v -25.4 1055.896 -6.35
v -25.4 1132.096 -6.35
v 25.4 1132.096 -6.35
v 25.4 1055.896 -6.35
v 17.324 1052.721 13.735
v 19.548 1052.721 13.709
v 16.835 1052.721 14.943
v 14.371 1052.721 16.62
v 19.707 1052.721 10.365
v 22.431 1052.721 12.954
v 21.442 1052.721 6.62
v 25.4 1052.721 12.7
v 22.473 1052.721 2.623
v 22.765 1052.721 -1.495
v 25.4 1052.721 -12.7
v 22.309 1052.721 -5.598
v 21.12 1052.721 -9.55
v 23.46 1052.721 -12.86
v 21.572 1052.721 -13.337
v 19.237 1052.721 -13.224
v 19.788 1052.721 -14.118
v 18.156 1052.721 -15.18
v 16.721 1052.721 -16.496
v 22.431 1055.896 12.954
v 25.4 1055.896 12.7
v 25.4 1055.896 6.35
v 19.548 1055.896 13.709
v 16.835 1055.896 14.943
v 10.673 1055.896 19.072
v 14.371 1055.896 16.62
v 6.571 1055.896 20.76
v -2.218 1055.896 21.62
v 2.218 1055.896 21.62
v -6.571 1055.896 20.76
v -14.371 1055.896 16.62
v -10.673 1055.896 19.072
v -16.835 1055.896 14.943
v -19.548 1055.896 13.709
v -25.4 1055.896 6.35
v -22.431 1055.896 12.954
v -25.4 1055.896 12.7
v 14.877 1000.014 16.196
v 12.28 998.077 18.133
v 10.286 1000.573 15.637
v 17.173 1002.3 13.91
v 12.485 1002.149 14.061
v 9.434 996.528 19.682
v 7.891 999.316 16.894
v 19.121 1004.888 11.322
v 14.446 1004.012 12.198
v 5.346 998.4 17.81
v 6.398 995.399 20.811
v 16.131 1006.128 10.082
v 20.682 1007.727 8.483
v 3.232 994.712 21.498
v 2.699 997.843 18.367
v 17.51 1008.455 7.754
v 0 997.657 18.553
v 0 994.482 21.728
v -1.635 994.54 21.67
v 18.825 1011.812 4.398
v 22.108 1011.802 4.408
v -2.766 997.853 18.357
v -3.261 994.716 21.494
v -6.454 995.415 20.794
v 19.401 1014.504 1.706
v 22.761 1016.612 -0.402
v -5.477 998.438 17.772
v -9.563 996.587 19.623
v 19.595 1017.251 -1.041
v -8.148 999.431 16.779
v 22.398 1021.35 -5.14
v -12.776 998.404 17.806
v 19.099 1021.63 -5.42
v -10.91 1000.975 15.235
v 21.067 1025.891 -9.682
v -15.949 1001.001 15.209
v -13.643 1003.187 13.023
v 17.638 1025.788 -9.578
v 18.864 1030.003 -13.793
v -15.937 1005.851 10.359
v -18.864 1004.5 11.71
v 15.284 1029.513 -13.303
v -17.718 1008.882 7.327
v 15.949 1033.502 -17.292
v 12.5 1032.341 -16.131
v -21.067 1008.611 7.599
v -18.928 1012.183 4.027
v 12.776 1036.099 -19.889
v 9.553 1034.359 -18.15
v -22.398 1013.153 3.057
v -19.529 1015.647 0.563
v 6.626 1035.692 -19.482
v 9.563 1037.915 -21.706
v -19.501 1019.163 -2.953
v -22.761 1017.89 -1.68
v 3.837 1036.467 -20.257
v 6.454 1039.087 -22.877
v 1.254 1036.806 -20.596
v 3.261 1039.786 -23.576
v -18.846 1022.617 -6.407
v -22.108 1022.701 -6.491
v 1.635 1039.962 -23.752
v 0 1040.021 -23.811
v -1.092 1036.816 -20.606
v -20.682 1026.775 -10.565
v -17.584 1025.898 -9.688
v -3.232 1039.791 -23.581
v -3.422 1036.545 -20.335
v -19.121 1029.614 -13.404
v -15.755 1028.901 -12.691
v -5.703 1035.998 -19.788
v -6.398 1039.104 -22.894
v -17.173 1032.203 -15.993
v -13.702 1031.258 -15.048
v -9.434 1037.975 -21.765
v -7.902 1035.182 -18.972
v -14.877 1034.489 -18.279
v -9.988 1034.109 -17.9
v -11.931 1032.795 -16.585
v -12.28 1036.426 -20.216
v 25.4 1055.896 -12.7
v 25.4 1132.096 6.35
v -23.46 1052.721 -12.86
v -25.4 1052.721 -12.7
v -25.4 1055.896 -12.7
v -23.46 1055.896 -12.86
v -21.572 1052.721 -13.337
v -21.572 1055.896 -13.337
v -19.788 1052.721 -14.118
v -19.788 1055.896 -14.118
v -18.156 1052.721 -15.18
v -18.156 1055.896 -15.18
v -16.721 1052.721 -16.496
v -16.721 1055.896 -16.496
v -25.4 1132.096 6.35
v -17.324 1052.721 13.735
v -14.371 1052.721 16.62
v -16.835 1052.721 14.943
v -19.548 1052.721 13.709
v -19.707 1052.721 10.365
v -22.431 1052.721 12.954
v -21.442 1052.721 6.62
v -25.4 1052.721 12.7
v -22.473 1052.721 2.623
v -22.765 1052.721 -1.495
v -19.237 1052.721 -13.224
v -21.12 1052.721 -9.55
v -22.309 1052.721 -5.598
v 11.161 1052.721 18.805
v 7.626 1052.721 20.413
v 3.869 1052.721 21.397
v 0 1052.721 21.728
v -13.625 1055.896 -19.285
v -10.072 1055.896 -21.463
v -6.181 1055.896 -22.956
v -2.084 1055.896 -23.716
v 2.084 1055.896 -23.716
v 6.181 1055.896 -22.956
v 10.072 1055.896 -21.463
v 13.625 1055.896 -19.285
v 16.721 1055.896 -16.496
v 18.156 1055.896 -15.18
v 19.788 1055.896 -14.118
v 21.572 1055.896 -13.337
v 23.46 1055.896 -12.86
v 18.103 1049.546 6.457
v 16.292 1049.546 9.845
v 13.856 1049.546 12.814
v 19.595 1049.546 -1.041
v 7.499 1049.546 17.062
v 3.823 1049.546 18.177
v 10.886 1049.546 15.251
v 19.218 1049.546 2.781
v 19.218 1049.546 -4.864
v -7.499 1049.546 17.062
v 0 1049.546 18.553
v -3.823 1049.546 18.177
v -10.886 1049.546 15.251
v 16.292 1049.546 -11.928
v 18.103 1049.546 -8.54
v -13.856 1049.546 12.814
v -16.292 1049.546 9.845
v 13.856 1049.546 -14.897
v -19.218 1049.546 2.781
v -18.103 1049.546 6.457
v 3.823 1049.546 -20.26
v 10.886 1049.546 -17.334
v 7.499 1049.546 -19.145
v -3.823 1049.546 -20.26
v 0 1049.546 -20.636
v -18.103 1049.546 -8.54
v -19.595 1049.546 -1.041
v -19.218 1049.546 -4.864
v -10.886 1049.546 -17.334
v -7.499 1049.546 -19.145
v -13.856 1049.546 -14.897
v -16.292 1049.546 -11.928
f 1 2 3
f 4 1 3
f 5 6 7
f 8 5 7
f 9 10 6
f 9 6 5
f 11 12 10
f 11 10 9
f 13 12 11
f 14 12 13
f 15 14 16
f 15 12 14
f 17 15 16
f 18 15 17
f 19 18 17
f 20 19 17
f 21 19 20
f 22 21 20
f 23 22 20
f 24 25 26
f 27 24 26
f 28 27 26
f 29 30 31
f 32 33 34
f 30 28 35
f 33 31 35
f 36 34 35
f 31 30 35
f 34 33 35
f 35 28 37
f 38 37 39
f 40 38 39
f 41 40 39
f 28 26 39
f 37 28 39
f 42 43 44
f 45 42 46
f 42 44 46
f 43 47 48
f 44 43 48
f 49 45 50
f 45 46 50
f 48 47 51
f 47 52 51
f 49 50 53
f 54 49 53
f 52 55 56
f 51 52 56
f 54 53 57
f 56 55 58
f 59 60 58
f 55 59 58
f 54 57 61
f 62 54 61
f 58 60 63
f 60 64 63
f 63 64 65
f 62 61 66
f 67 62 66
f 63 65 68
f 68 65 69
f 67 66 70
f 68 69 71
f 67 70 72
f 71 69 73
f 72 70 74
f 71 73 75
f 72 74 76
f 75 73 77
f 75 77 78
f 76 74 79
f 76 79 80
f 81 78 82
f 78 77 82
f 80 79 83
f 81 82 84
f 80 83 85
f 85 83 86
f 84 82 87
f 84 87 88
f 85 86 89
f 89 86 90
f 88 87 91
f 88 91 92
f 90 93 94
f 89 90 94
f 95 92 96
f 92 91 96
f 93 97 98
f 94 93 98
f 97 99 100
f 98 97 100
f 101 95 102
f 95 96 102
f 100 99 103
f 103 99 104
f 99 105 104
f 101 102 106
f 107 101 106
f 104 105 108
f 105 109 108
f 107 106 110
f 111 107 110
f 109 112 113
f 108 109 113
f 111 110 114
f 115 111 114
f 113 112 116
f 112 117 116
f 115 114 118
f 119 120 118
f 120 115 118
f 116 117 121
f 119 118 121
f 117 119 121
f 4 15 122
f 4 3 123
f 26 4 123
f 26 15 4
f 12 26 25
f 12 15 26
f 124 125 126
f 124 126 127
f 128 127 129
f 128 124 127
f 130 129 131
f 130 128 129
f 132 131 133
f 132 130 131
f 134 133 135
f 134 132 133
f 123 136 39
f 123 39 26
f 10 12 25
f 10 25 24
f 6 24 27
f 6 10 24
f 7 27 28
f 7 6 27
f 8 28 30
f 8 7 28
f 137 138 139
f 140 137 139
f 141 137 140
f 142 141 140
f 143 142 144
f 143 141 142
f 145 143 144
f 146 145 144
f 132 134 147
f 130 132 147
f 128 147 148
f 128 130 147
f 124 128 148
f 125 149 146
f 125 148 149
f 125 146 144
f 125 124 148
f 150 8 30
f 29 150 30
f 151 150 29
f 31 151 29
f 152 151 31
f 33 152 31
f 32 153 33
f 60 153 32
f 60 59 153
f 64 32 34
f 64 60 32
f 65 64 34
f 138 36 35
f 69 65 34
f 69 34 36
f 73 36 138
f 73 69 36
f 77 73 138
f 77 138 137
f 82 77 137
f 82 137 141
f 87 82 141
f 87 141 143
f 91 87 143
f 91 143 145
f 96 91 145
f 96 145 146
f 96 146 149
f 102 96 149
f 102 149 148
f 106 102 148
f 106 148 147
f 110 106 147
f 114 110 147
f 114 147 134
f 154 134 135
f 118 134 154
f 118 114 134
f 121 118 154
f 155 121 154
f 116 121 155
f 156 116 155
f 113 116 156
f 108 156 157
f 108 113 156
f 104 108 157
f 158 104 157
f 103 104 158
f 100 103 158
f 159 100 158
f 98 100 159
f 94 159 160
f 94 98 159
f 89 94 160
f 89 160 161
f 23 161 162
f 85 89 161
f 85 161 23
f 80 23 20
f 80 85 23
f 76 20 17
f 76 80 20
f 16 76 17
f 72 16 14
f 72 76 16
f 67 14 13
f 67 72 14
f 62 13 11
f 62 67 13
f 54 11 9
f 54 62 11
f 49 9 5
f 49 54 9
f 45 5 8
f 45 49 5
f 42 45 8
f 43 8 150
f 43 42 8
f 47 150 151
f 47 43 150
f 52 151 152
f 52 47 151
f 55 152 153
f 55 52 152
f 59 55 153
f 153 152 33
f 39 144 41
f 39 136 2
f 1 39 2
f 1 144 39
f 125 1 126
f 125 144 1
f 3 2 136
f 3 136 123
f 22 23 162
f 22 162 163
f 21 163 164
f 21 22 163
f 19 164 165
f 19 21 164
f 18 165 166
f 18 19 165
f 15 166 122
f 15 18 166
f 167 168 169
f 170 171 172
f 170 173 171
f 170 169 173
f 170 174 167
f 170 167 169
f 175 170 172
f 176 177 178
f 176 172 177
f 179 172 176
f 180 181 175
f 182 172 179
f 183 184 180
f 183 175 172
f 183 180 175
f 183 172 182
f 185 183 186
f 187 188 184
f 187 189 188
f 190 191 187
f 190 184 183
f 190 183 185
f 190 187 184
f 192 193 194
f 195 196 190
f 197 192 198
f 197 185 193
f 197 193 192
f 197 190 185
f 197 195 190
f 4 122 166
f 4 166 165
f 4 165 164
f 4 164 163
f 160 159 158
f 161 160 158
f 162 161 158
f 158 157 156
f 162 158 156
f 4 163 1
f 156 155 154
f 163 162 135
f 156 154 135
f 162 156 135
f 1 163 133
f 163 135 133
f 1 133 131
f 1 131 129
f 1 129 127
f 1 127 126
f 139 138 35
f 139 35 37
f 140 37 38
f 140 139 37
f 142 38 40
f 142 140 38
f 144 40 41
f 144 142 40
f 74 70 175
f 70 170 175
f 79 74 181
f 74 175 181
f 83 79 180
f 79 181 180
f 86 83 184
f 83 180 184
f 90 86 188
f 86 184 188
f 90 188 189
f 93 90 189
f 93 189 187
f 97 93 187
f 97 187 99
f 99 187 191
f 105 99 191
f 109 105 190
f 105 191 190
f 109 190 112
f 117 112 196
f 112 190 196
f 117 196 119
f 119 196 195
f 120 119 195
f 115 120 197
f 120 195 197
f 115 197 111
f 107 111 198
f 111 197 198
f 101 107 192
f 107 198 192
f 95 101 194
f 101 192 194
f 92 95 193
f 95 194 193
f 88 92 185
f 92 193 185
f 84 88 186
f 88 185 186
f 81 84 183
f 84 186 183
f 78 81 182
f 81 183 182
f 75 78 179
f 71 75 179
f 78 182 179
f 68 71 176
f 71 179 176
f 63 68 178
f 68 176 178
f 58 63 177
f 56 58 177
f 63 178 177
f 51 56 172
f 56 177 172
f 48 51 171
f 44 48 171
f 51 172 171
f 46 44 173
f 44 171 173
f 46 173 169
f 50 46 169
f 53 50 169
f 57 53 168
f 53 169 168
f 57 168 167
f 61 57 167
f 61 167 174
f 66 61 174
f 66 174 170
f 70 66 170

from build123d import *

# Parameters (mm, degrees)
CUT_EXTRUDE1_DEPTH      = 1054.2364613417774
CUT_EXTRUDE1_DEPTH_BACK = 1054.2364613417774
SHELL1_OUTLINE_W        = 19.594743879
SHELL1_OUTLINE_H        = 51.88948775799986
BOSS_EXTRUDE1_DEPTH     = 3.175
SKETCH5_W               = 50.79999999999999
SKETCH5_H               = 12.699999999999998
BOSS_EXTRUDE2_DEPTH     = 76.2


# Read off the part's stored shape, not the designer's step: Shell1
with BuildPart() as part:
    # Sketch2 → Revolve1 (revolve)
    with BuildSketch(Plane(origin=(0, 0, 0), x_dir=(0, 0, -1), z_dir=(1, 0, 0))):
        Polygon((1.0414000000000794, 1052.7210512242139), (-21.7283438789312, 1052.7210512242139), (-21.7283438789312, 994.4815634663521), (1.0414000000000847, 994.4815634663521), align=None)
    revolve(axis=Axis((0, 1052.7210512242139, -1.0414000000000794), (0, -1, -9e-17)))

    # Sketch3 → Cut-Extrude1 (cut, two sides: drawn at the far end of the back side and taken through both)
    with BuildSketch(Plane(origin=(0, 0, 0), x_dir=(0, 0, -1), z_dir=(1, 0, 0)).offset(-CUT_EXTRUDE1_DEPTH_BACK)):
        Polygon((-21.7283438789312, 994.4815634663521), (23.811143878931354, 1040.0210512242138), (23.811143878931365, 994.4815634663521), align=None)
    extrude(amount=CUT_EXTRUDE1_DEPTH + CUT_EXTRUDE1_DEPTH_BACK, mode=Mode.SUBTRACT)

    # Shell1 outline → Shell1 (revolve, cut)
    with BuildSketch(Plane.XY.offset(-1.0414)):
        with Locations((9.7973719395, 1023.601307345)):
            Rectangle(SHELL1_OUTLINE_W, SHELL1_OUTLINE_H)
    revolve(axis=Axis((0, 0, -1.0414), (0, 1, 0)), mode=Mode.SUBTRACT)

    # Sketch4 → Boss-Extrude1 (add)
    with BuildSketch(Plane(origin=(0, 1052.7210512242139, 9.407e-14), x_dir=(1, 0, 0), z_dir=(0, 1, 0))):
        with BuildLine():
            Line((25.4, 12.700000000000092), (25.4, -12.699999999999907))
            ThreePointArc((25.4, -12.699999999999907), (19.547591344304465, -13.709181649641387), (14.371169963720073, -16.62016024211882))
            ThreePointArc((14.371169963720073, -16.62016024211882), (-8.72e-15, -21.72834387893111), (-14.371169963720085, -16.620160242118818))
            ThreePointArc((-14.371169963720085, -16.620160242118818), (-19.54759134430447, -13.709181649641383), (-25.4, -12.699999999999907))
            Line((-25.4, -12.699999999999907), (-25.4, 12.700000000000092))
            ThreePointArc((-25.4, 12.700000000000092), (-20.663631299775105, 13.690635523953107), (-16.72131200571086, 16.496462637200914))
            ThreePointArc((-16.72131200571086, 16.496462637200914), (1.39e-15, 23.811143878931446), (16.72131200571086, 16.496462637200906))
            ThreePointArc((16.72131200571086, 16.496462637200906), (20.663631299775105, 13.690635523953098), (25.4, 12.700000000000092))
        make_face()
    extrude(amount=BOSS_EXTRUDE1_DEPTH)

    # Sketch5 → Boss-Extrude2 (add)
    with BuildSketch(Plane(origin=(0, 1055.8960512242138, 0), x_dir=(1, 0, 0), z_dir=(0, 1, 0))):
        Rectangle(SKETCH5_W, SKETCH5_H)
    extrude(amount=BOSS_EXTRUDE2_DEPTH)


solid = part.part
